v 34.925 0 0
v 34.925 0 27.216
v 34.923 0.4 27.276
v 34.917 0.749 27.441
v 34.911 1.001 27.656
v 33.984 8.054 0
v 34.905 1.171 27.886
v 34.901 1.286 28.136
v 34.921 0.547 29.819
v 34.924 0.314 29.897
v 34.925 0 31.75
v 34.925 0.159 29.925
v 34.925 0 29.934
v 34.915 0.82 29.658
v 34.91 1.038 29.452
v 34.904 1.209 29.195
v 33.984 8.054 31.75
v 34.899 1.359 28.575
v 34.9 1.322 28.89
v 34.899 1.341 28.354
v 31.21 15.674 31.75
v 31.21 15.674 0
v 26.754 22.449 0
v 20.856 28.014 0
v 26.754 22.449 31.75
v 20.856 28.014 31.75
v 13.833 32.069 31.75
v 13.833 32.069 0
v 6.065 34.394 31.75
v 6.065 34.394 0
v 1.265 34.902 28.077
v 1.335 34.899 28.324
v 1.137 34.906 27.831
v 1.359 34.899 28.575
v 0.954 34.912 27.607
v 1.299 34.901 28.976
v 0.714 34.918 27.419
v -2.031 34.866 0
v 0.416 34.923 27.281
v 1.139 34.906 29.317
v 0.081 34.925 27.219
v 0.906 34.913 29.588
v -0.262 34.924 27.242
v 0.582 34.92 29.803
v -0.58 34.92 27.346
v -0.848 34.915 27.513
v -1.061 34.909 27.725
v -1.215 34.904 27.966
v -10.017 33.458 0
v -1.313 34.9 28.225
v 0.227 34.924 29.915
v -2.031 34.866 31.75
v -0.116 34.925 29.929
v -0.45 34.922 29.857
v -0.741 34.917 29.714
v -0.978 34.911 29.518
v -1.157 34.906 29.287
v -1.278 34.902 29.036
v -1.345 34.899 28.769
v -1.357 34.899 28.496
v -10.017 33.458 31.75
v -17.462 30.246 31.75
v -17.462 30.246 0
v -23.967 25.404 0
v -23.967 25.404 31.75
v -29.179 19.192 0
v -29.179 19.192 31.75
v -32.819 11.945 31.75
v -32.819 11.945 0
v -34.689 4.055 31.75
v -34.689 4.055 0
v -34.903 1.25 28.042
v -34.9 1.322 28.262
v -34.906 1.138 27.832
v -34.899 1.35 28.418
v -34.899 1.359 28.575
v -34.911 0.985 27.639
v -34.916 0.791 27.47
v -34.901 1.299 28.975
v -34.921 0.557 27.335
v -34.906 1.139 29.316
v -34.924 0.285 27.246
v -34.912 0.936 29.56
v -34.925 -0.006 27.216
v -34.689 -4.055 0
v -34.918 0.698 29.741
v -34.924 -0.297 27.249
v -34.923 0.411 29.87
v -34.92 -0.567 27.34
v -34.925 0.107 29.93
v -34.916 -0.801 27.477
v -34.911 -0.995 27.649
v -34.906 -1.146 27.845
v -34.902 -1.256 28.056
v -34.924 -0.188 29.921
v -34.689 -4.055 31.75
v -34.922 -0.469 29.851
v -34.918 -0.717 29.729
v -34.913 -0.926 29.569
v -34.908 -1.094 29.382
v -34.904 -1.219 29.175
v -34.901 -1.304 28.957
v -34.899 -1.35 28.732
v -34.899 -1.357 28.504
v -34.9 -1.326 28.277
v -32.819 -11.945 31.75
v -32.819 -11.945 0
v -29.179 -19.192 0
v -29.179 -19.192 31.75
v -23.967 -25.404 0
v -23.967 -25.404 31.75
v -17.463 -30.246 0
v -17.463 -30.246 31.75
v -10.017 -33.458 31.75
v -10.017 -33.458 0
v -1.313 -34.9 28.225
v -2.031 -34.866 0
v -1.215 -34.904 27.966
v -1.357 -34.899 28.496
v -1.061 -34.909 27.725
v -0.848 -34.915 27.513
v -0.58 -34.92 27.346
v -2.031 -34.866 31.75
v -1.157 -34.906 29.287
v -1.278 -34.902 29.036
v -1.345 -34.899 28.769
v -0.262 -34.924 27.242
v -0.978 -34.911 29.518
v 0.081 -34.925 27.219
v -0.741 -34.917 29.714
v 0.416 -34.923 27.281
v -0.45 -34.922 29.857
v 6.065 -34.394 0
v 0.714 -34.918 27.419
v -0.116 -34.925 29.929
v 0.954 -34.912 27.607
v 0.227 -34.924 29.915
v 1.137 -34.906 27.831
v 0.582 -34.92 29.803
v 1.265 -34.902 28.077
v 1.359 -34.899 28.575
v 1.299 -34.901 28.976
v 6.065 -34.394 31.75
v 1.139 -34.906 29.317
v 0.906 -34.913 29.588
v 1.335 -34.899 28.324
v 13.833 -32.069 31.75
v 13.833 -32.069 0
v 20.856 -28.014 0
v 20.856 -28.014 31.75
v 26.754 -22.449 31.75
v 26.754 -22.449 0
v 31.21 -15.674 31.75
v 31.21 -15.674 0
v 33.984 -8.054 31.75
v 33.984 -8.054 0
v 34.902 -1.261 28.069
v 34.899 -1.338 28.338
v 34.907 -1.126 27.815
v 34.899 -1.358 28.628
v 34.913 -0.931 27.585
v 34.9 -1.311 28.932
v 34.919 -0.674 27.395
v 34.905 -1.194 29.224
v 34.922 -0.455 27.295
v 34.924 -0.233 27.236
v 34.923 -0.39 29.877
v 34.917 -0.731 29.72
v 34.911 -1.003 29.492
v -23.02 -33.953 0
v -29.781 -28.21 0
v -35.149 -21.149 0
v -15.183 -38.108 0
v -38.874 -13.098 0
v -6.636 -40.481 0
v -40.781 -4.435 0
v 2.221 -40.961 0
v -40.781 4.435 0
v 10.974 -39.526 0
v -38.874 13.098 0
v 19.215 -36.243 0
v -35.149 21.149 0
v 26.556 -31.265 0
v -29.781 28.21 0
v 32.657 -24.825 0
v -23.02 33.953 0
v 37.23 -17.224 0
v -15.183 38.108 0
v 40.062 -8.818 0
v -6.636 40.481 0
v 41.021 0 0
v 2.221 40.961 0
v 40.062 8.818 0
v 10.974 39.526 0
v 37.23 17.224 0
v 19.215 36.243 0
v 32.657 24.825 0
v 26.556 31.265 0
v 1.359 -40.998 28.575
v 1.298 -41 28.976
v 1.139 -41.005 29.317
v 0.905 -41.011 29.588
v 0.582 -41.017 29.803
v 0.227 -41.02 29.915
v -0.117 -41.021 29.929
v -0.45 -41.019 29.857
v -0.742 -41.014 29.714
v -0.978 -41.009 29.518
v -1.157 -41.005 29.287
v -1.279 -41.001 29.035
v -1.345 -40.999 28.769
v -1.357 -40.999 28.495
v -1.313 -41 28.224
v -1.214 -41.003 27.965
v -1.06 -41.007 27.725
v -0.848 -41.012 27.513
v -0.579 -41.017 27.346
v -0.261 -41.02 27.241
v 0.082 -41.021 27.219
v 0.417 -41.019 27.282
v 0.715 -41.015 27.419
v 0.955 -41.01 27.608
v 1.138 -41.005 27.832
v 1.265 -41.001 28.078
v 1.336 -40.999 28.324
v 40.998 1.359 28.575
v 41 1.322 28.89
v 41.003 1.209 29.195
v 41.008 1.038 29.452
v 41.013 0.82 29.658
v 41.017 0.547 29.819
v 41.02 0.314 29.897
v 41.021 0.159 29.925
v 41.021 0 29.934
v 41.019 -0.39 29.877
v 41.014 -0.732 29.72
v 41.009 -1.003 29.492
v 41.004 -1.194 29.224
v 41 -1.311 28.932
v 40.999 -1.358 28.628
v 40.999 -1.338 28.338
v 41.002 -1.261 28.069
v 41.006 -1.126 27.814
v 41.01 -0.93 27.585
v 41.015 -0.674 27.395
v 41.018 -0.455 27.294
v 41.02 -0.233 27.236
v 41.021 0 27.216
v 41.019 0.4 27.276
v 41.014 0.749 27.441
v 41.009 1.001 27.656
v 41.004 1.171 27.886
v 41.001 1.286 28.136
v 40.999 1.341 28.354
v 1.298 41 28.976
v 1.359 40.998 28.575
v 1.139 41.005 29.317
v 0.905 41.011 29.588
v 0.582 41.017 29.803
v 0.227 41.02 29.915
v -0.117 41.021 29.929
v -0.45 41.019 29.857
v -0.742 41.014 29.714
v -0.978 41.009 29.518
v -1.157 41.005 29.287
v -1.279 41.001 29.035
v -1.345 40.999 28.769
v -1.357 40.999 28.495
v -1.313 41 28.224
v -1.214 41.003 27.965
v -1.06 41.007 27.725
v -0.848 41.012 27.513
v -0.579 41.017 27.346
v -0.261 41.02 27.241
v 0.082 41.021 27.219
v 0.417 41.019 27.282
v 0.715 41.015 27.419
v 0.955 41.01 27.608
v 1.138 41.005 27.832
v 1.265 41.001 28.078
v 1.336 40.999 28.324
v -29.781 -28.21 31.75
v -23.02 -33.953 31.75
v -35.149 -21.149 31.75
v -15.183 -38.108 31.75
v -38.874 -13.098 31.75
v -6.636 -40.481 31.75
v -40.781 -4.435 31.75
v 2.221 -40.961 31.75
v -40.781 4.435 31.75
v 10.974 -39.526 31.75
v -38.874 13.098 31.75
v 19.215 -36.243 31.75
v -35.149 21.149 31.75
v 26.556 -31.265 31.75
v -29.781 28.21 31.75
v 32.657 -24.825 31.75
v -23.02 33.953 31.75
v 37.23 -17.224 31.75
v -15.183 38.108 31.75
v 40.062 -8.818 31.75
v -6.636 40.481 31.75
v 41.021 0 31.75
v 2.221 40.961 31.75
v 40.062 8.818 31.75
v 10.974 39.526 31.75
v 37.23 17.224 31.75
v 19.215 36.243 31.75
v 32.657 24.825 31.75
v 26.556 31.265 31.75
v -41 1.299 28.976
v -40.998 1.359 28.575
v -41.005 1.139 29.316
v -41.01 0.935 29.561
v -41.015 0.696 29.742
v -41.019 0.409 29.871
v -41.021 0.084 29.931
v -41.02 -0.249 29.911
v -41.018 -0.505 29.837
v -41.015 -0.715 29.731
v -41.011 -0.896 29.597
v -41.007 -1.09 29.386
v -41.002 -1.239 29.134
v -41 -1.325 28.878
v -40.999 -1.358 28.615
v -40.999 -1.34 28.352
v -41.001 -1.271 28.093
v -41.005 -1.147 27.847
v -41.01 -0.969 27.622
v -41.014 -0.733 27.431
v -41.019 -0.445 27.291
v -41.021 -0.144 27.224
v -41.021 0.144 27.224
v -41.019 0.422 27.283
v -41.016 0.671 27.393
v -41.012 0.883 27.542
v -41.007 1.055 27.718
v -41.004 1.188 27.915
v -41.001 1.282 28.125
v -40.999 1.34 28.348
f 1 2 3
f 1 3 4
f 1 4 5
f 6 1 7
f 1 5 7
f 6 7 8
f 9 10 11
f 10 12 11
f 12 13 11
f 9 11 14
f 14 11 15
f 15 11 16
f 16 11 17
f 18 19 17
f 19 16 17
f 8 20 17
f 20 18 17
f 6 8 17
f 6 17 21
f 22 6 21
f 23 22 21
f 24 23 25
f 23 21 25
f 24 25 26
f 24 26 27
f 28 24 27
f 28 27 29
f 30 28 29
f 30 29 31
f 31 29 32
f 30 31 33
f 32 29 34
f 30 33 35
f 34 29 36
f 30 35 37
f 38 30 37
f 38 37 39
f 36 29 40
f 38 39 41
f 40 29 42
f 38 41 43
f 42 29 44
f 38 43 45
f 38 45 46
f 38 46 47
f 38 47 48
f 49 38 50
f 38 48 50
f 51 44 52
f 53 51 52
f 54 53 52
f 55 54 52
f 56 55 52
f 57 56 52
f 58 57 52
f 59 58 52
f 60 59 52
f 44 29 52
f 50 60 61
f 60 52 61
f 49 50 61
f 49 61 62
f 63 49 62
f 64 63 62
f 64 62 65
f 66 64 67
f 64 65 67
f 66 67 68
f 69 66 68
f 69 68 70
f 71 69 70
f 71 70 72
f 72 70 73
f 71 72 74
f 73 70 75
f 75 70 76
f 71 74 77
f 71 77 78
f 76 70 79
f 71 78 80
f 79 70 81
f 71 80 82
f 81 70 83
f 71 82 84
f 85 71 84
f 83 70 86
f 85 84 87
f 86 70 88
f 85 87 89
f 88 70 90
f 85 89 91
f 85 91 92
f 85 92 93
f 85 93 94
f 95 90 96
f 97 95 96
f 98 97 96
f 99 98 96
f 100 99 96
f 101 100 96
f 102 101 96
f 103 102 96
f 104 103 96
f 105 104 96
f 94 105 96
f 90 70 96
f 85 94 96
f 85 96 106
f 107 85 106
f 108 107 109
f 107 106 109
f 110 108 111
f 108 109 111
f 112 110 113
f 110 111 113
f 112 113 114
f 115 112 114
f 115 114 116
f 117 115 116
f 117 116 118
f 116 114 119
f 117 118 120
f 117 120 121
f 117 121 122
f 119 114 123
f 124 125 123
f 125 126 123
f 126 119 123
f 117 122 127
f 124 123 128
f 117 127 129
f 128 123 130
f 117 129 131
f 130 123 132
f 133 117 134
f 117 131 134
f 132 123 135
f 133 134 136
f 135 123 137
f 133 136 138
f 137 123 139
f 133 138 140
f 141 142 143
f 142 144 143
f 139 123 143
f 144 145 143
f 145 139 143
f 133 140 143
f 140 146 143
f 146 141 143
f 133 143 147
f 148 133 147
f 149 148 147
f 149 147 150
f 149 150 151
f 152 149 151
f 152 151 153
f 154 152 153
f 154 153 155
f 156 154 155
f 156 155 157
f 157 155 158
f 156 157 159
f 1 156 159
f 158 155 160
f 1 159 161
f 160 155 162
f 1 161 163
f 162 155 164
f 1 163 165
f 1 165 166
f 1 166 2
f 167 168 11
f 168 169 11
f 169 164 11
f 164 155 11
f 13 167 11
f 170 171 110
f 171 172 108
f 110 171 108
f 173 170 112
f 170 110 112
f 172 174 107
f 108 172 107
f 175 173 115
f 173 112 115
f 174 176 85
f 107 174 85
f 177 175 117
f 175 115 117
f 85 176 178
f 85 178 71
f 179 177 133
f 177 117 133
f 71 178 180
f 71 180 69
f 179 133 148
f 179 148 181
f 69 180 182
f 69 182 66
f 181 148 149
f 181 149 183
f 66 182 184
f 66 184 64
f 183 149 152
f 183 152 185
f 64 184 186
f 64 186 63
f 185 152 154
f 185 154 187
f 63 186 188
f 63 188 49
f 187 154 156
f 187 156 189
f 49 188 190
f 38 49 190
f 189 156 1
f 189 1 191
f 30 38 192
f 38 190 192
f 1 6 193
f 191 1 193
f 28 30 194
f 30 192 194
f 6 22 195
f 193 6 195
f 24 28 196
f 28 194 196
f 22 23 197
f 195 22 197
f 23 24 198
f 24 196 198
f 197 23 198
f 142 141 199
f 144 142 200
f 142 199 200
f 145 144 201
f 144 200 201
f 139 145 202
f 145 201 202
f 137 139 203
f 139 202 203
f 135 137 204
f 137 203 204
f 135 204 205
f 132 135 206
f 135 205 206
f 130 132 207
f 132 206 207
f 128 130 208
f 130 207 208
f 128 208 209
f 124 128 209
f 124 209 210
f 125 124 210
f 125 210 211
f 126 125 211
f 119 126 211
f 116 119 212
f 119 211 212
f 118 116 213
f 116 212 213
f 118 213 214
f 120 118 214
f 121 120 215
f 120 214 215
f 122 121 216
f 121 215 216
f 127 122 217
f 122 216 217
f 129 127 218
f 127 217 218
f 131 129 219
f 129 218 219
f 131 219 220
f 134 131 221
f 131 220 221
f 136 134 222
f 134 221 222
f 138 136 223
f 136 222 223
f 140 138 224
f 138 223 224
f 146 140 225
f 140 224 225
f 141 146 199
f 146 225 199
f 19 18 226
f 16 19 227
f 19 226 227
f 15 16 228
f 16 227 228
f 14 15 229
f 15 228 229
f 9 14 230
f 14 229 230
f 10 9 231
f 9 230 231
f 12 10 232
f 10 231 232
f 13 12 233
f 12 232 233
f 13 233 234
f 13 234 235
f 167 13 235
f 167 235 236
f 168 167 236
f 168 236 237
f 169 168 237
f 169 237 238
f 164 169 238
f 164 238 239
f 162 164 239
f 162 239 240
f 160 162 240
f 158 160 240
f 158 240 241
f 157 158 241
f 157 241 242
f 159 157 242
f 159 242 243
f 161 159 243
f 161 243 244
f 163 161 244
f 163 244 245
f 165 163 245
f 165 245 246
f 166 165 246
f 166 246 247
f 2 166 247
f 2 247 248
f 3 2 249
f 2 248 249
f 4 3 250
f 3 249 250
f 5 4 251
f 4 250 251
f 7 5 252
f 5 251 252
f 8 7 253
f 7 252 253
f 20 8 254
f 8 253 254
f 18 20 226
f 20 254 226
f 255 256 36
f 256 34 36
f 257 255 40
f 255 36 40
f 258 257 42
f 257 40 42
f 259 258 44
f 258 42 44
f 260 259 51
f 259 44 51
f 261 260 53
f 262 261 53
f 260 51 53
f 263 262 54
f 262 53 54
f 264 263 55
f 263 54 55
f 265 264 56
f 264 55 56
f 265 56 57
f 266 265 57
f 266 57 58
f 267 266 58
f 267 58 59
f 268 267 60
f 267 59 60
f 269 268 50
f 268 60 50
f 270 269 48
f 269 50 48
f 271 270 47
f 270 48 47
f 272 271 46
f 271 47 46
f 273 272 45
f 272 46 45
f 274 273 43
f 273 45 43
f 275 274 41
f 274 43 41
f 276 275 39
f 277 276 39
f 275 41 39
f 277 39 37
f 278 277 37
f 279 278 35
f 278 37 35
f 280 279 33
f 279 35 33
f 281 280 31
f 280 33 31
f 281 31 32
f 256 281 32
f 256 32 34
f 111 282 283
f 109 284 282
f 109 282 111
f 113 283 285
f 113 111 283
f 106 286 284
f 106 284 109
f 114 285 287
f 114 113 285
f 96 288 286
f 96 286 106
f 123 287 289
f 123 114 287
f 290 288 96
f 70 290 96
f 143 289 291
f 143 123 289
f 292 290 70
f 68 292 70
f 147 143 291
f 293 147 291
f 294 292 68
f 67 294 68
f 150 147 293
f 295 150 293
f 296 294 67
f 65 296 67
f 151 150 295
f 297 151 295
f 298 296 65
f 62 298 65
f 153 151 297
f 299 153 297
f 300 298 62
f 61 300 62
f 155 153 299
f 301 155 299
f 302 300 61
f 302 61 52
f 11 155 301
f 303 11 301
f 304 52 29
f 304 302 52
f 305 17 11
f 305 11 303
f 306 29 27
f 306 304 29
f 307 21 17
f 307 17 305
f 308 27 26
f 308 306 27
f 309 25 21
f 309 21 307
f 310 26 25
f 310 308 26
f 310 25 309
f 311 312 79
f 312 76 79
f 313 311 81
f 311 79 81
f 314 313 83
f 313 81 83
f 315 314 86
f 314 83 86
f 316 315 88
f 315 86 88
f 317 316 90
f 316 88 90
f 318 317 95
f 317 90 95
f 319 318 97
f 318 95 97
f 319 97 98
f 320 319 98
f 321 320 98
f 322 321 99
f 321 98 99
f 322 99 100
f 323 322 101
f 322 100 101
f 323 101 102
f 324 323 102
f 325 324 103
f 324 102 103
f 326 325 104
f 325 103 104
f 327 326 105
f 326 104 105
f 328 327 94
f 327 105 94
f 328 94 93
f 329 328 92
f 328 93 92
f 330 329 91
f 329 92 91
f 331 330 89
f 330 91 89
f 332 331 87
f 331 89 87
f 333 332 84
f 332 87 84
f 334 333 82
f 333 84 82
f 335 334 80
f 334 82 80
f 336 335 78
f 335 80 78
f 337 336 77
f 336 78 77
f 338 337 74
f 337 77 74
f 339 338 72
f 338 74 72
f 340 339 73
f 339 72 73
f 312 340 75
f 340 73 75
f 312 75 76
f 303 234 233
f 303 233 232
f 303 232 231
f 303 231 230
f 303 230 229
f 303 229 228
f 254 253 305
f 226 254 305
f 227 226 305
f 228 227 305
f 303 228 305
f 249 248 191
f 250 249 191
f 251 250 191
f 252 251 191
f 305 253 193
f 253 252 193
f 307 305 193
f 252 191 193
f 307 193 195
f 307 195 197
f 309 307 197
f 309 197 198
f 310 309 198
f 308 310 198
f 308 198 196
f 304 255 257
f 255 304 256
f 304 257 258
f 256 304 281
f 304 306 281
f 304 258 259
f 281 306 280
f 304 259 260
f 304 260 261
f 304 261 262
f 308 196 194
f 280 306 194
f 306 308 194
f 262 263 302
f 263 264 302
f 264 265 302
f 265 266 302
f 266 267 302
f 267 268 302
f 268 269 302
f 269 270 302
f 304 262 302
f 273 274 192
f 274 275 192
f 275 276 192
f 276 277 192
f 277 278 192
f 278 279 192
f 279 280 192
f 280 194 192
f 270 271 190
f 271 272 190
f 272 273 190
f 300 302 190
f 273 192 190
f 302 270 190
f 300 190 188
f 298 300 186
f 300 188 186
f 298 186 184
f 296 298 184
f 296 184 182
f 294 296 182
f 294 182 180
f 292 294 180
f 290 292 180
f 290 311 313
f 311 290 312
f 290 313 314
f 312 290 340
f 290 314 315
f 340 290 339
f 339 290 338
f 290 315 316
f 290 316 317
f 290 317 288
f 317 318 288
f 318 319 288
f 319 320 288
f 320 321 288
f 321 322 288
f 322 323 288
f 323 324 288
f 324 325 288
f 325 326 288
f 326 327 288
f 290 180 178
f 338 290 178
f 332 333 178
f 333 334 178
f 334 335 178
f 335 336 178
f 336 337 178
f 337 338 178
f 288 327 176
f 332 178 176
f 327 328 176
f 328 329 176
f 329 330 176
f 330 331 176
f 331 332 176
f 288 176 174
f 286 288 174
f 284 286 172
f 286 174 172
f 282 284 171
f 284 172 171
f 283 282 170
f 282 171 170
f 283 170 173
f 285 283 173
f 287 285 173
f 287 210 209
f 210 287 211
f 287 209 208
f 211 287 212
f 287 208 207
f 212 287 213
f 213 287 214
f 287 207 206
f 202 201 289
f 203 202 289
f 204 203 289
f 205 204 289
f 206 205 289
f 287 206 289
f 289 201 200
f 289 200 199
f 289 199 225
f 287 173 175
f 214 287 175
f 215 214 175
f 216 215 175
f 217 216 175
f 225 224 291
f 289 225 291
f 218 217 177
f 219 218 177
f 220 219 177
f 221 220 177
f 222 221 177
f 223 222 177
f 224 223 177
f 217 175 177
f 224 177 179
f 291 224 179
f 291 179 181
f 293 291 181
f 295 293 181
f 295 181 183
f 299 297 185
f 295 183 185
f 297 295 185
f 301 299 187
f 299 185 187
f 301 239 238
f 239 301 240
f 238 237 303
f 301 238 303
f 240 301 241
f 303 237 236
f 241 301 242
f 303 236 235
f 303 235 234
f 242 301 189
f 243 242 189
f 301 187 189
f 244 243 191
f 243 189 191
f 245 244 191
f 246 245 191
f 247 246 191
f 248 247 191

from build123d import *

# Parameters (mm, degrees)
F0_R     = 41.021
F1_DEPTH = 31.75
F2_R     = 34.925
F3_DEPTH = 31.751
F4_R     = 1.3589
F5_DEPTH = 44.45
F6_R     = 1.3589
F7_DEPTH = 44.45


with BuildPart() as f1:
    # F0 (on Top) → F1 (new body)
    with BuildSketch(Plane.XY):
        Circle(F0_R)
    extrude(amount=F1_DEPTH)

    # F2 (on face) → F3 (cut, through all)
    with BuildSketch(Plane.XY.offset(31.75)):
        Circle(F2_R)
    extrude(amount=-F3_DEPTH, mode=Mode.SUBTRACT)

    # F4 (on Front) → F5 (cut, symmetric)
    with BuildSketch(Plane.XZ):
        with Locations((0, 28.575)):
            Circle(F4_R)
    extrude(amount=F5_DEPTH, both=True, mode=Mode.SUBTRACT)

    # F6 (on Right) → F7 (cut, symmetric)
    with BuildSketch(Plane.YZ):
        with Locations((0, 28.575)):
            Circle(F6_R)
    extrude(amount=F7_DEPTH, both=True, mode=Mode.SUBTRACT)


solid = f1.part
